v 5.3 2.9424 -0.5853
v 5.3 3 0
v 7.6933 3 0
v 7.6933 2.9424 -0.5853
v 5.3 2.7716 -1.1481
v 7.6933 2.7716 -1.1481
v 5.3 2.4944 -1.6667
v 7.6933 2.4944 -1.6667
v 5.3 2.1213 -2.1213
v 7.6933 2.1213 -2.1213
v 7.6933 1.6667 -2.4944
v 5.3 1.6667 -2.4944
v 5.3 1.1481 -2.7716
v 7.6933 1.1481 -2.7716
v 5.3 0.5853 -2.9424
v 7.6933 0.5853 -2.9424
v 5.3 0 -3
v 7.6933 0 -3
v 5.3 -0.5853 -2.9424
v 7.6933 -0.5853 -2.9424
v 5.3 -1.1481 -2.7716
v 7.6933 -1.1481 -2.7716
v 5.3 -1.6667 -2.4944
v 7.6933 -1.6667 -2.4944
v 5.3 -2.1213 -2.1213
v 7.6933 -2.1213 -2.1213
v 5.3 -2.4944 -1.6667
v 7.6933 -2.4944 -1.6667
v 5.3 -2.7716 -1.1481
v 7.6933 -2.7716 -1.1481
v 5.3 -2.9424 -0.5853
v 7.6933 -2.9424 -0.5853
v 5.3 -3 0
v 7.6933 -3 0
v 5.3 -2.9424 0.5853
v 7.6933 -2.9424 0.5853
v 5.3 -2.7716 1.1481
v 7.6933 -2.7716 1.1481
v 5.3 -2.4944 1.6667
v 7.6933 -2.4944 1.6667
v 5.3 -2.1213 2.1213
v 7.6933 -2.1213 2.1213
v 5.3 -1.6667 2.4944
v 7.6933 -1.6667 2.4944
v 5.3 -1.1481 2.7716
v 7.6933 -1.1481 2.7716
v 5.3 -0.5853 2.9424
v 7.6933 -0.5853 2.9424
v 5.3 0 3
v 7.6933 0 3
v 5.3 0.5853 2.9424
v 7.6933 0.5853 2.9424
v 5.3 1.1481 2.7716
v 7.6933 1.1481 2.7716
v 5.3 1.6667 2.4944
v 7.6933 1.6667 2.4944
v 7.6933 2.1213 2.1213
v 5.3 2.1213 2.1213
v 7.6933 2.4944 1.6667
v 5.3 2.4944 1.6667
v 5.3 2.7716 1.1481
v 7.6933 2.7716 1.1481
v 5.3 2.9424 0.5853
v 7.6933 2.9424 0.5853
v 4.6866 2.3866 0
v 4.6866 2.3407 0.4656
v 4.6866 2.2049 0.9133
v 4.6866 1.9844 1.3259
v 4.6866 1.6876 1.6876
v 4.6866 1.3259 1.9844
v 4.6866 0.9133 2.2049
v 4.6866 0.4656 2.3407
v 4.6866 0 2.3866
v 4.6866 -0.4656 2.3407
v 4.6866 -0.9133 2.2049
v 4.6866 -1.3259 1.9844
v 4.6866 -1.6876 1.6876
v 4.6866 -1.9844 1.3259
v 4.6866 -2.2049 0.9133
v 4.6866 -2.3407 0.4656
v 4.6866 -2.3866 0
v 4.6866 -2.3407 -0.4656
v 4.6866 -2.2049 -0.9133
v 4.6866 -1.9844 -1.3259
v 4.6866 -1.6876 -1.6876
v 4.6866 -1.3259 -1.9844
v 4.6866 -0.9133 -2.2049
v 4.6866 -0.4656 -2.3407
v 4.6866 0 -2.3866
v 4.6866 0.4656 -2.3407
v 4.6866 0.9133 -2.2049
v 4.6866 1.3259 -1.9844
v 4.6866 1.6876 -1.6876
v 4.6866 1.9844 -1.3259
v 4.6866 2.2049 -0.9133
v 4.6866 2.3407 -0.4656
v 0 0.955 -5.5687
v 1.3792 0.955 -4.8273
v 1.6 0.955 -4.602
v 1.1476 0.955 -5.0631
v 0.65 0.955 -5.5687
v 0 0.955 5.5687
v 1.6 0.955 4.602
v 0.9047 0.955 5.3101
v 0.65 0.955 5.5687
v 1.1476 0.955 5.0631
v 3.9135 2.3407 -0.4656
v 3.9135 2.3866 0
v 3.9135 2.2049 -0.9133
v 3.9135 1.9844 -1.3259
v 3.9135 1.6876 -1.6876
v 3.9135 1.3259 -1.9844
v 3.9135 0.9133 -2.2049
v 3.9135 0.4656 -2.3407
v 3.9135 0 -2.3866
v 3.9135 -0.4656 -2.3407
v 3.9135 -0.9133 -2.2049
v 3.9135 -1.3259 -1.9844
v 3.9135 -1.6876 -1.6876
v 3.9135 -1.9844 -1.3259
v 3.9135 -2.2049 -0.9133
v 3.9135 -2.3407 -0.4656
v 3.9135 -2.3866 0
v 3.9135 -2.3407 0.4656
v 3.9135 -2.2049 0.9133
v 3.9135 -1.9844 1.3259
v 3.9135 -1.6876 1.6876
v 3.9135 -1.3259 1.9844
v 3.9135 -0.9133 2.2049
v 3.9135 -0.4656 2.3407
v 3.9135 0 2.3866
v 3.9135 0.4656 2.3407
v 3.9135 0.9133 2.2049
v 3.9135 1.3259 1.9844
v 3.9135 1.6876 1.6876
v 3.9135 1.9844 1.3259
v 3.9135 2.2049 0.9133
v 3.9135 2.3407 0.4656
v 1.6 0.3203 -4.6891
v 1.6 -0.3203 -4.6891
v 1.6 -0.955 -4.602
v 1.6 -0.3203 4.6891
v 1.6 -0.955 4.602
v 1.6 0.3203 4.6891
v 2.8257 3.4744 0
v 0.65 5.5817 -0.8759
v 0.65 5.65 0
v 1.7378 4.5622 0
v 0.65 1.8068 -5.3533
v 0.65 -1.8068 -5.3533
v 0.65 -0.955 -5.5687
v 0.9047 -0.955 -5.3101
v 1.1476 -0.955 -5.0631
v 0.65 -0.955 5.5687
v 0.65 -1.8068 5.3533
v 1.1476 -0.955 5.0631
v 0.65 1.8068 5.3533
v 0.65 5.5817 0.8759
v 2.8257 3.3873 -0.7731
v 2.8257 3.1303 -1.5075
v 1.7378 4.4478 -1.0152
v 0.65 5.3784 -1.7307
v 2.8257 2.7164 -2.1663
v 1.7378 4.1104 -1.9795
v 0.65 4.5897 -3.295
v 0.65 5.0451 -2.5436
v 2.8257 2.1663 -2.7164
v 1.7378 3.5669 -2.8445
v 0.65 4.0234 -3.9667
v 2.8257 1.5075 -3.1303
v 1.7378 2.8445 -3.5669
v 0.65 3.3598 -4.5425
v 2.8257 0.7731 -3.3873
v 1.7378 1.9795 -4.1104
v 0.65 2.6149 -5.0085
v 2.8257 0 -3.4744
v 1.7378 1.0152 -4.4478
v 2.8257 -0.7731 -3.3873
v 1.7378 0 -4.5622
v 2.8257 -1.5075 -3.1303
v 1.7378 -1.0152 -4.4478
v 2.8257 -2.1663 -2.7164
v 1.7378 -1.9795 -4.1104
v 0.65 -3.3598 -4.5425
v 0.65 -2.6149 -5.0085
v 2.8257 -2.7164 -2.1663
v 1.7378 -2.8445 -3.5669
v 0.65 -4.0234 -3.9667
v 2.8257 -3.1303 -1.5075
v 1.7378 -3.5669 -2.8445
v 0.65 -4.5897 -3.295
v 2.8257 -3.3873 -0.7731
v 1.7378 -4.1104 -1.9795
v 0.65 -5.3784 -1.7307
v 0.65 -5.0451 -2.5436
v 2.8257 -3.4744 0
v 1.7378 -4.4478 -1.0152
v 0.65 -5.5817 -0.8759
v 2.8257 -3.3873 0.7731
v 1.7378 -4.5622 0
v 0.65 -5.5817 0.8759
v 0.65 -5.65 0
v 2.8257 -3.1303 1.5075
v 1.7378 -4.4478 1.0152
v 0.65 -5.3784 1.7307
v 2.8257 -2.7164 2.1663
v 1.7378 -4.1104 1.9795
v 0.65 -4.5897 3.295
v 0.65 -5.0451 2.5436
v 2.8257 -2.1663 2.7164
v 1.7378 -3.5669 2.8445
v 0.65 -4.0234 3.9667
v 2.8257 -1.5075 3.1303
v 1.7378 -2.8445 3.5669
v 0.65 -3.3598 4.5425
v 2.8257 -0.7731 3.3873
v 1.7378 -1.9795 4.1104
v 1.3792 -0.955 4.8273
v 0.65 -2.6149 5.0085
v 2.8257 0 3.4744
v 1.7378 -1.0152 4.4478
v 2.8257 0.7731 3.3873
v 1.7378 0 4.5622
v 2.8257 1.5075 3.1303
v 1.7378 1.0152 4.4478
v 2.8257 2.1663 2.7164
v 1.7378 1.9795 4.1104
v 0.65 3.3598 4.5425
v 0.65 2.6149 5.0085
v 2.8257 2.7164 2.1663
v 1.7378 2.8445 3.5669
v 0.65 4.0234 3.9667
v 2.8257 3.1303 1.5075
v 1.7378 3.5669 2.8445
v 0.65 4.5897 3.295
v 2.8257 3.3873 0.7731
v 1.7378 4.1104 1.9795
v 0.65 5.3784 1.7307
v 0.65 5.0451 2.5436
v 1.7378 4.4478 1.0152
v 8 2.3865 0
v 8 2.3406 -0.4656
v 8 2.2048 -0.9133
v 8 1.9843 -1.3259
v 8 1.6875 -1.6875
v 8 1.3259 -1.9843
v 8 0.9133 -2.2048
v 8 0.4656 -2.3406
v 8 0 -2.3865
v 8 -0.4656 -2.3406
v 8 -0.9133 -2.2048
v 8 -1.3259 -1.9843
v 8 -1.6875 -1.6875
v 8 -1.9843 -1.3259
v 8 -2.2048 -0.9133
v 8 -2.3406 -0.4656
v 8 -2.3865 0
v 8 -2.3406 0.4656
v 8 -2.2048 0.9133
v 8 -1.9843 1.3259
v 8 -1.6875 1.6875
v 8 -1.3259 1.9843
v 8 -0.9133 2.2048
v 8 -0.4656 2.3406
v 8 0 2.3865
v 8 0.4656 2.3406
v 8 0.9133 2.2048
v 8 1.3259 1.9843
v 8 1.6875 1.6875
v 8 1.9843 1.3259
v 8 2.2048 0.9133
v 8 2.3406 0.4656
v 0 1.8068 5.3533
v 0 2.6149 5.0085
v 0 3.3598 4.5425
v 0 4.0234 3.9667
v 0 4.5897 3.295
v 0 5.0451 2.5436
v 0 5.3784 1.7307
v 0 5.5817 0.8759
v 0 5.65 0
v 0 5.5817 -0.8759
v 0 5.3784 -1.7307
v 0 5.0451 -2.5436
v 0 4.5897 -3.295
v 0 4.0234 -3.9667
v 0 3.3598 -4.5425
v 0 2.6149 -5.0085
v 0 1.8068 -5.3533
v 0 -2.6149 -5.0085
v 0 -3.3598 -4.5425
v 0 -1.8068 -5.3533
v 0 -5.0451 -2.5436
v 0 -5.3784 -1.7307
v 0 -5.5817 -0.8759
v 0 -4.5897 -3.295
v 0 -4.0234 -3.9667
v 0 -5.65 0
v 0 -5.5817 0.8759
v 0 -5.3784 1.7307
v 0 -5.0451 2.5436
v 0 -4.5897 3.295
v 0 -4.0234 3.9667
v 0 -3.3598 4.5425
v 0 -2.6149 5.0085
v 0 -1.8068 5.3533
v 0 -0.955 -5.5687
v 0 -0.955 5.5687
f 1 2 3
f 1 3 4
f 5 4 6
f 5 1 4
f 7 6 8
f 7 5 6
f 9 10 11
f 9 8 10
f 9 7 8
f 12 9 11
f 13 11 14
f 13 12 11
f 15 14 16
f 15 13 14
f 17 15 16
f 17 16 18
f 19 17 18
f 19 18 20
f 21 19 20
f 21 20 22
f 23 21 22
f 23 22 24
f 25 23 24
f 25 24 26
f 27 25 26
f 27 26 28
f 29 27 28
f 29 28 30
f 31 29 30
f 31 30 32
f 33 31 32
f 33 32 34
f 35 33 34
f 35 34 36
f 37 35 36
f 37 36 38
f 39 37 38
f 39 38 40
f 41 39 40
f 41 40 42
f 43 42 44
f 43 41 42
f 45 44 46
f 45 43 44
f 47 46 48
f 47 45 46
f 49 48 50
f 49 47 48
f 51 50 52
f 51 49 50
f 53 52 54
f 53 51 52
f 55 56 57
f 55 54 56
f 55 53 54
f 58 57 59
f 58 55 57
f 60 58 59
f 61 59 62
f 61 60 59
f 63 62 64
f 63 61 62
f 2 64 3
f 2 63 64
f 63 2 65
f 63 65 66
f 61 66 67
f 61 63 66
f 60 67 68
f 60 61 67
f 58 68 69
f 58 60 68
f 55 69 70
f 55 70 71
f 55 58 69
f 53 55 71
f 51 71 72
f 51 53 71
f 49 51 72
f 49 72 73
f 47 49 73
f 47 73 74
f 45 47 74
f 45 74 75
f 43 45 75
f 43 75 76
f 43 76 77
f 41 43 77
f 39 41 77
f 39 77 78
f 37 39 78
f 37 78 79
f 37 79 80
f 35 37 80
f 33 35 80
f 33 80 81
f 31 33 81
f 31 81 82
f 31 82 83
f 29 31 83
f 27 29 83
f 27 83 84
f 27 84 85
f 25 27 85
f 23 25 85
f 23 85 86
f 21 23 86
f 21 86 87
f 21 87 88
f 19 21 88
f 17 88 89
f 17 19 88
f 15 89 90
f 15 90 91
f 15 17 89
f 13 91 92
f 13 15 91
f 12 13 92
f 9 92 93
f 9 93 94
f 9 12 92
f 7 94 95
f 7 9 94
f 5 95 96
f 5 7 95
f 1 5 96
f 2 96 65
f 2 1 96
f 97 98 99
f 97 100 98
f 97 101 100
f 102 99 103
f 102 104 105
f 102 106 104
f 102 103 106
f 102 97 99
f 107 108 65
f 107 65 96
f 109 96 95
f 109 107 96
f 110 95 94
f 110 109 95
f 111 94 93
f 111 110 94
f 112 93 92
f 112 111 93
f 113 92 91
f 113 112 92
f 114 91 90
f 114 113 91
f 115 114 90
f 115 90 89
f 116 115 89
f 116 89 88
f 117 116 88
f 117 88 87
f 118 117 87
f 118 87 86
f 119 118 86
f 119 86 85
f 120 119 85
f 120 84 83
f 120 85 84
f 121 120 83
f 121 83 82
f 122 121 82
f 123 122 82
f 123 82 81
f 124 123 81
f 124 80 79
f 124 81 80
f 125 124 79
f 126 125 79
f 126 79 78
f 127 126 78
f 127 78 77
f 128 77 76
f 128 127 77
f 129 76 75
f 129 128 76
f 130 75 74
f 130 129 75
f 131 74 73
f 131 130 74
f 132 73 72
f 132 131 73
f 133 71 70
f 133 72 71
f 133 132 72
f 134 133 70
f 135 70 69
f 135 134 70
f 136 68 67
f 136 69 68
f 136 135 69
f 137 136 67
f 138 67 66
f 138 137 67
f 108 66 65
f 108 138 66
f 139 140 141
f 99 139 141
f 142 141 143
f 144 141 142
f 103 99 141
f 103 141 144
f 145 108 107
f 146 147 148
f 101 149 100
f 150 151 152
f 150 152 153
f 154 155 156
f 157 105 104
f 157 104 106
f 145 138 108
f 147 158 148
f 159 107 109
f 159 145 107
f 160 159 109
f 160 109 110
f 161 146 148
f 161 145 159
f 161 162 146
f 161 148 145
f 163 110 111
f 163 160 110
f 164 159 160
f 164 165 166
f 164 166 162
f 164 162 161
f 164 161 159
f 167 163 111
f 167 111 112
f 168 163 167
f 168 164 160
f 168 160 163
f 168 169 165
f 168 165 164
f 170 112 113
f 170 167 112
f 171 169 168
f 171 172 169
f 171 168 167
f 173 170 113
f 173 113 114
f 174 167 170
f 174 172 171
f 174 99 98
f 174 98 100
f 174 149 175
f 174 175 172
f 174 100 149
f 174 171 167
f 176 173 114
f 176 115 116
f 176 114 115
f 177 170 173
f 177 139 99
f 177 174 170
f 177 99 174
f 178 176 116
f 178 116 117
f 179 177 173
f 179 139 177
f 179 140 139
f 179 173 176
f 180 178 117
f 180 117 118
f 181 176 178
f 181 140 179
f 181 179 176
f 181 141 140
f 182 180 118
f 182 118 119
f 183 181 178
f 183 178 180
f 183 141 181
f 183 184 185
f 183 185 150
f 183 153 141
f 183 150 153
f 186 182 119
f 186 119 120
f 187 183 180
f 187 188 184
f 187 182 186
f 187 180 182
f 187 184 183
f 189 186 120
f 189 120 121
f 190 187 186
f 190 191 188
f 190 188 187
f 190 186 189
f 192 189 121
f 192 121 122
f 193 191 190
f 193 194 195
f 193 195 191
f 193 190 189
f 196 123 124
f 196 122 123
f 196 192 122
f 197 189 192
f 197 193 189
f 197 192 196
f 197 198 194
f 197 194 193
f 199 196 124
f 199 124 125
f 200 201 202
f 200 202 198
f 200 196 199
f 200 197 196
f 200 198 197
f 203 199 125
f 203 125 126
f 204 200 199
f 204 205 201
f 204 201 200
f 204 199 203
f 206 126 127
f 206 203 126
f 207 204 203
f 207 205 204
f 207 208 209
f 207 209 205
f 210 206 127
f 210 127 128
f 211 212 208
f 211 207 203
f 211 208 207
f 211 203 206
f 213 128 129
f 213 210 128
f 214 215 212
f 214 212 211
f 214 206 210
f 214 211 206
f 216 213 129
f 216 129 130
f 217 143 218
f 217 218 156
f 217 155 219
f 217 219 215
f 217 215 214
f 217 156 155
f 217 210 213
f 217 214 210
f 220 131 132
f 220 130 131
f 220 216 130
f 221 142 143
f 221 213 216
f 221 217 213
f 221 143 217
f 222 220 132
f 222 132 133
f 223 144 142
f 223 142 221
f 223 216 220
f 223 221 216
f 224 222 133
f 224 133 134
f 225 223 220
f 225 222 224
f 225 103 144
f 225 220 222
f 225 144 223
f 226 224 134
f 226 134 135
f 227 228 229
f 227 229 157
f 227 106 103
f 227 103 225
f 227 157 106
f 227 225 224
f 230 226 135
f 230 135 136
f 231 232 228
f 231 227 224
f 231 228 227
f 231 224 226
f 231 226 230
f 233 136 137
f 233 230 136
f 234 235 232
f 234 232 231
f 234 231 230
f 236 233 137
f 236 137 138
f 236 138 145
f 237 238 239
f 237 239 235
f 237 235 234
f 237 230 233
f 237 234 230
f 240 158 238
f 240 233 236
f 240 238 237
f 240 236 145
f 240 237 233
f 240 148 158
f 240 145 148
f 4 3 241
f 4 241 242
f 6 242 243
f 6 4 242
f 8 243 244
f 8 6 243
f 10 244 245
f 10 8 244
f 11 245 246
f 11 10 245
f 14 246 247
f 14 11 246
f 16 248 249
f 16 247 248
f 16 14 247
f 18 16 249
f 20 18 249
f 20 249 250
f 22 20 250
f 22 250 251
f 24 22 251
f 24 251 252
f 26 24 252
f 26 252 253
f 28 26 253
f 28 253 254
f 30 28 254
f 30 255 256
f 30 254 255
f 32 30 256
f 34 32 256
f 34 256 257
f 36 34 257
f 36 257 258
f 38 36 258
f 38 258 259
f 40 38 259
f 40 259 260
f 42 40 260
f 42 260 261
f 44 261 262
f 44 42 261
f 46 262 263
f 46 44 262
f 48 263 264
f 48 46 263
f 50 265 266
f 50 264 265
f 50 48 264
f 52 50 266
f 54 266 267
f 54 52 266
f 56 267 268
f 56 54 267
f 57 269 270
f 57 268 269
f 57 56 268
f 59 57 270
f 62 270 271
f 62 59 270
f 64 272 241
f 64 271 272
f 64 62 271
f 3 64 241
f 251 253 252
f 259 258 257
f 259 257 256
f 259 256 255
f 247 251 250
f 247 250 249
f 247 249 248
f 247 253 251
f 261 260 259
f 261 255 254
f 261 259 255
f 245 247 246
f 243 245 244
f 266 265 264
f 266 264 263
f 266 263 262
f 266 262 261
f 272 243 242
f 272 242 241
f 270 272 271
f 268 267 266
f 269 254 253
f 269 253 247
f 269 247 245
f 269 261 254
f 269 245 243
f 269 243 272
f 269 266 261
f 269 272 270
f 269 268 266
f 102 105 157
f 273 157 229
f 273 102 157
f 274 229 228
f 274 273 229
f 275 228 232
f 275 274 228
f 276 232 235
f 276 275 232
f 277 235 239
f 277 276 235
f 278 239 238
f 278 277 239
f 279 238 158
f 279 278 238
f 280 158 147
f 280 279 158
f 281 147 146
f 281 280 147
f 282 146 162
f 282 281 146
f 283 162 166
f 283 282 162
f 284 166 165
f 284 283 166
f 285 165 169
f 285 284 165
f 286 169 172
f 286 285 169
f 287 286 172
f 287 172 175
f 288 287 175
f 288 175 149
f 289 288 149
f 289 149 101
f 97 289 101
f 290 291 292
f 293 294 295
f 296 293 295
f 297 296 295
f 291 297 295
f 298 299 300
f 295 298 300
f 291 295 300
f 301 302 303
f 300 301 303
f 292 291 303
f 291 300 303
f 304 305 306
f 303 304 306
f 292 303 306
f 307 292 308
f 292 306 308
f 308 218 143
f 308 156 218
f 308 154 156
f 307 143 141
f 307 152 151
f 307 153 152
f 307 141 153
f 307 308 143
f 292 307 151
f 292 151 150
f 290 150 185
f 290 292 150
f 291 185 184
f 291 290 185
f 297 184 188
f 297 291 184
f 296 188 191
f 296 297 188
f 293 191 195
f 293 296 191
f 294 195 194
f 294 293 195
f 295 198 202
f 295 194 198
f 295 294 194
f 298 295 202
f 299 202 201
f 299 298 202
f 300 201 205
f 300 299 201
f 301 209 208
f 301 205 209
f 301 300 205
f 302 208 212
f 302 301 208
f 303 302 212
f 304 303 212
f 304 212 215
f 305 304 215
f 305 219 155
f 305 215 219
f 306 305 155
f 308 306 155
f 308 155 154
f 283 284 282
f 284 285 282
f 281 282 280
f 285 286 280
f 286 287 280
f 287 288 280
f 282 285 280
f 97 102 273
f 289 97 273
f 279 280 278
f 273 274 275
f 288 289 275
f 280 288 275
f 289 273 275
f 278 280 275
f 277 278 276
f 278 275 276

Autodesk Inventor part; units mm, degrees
ref_plane "YZ Plane" through (0, 0, 0) normal (1, 0, 0) x (0, 1, 0)
ref_plane "XZ Plane" through (0, 0, 0) normal (0, 1, 0) x (-1, 0, 0)
sketch "Sketch1" plane through (0, 0, 0) normal (0, 0, 1) x (1, 0, 0)
  line L0 (0, 0) -> (8, 0)
  line L1 (8, 0) -> (8, 3)
  line L2 (8, 3) -> (5.3, 3)
  line L3 (5.3, 3) -> (4.6866, 2.3866)
  line L4 (4.6866, 2.3866) -> (3.9135, 2.3866)
  line L5 (3.9135, 2.3866) -> (0.65, 5.65)
  line L6 (0.65, 5.65) -> (0, 5.65)
  line L7 (0, 5.65) -> (0, 0)
  line L8 (5.3, 3) -> (3.3, 3) construction
  line L9 (-1.6, 0) -> (9.6, 0) projected
  line L10 (0, 6.78) -> (0, -1.13) projected
  dimension "d0" = 8
  dimension "d1" = 45
  dimension "d2" = 0.6135
  dimension "d3" = 2.7
  dimension "d4" = 3.3
  dimension "d5" = 4.7731
  dimension "d6" = 6
  dimension "d7" = 11.3
revolve "Body" add sketch "Sketch1" angle 360 about axis through (0, 0, 0) along (1, 0, 0)
sketch "Sketch2" plane through (0, 0, 0) normal (-1, 0, 0) x (0, 0, 1)
  line L0 (5.65, -0.955) -> (-5.65, -0.955)
  line L1 (-5.65, -0.955) -> (-5.65, 0.955)
  line L2 (-5.65, 0.955) -> (5.65, 0.955)
  line L3 (5.65, 0.955) -> (5.65, -0.955)
  line L4 (0, 0.955) -> (0, -0.955) construction
  line L5 (-5.65, 0) -> (5.65, 0) construction
  line L6 (0, 5.65) -> (0, 0) projected
  dimension "d15" = 1.91
  dimension "d16" = 11.3
extrude "Slot" cut sketch "Sketch2" against normal blind 1.6
thread "Thread" size "M6x1" class "6g" standard "ISO Metric profile" length 2.7
chamfer "Chamfer1" distance 0.6135 distance2 0.3067 1 edges at (8, -3, 0) measured on face at (8, 0.7485, -0.6631)
ref_plane "Work Plane1" through (33.575, 0, 0) normal (0, 0, -1) x (1, 0, 0)
equation "\"d15\" = SBR"
equation "\"d16\" = KOD"
equation "\"d8\" = STI"
equation "\"d10\" = GEL"
equation "\"d12\" = -0.5 * SPD + 0.5 * GD"
equation "\"d13\" = 0.5 * GAL"
equation "\"d0\" = NLG"
equation "\"d1\" = 0.5 * SEWI"
equation "\"d2\" = GAL"
equation "\"d3\" = GEL"
equation "\"d4\" = KOH"
equation "\"d5\" = BDM"
equation "\"d6\" = GD"
equation "\"d7\" = KOD"
equation "\"NLG\" = 8"
equation "\"GAL\" = 0.61345 * PTC"
equation "\"GEL\" = 2.7"
equation "\"KOH\" = 3.3"
equation "\"KOD\" = 11.3"
equation "\"SEWI\" = 90deg"
equation "\"BDM\" = NND - 1.2269 * PTC"
equation "\"GD\" = NND"
equation "\"SBR\" = 1.91"
equation "\"STI\" = 1.6"
equation "\"SPD\" = NND - 1.2269 * PTC"
equation "\"GUL\" = 0.61345 * PTC"
equation "\"PTC\" = 1"
equation "\"EPV\" = 6.3"
equation "\"THREADDIA\" = 6"
equation "\"TOA\" = 30deg"
equation "\"NND\" = 6"
equation "\"GD1\" = THREADDIA - 1.2269 * PTC"
properties part number "ISO 2009 - M6 x 8" material "Stainless Steel, 440C"
